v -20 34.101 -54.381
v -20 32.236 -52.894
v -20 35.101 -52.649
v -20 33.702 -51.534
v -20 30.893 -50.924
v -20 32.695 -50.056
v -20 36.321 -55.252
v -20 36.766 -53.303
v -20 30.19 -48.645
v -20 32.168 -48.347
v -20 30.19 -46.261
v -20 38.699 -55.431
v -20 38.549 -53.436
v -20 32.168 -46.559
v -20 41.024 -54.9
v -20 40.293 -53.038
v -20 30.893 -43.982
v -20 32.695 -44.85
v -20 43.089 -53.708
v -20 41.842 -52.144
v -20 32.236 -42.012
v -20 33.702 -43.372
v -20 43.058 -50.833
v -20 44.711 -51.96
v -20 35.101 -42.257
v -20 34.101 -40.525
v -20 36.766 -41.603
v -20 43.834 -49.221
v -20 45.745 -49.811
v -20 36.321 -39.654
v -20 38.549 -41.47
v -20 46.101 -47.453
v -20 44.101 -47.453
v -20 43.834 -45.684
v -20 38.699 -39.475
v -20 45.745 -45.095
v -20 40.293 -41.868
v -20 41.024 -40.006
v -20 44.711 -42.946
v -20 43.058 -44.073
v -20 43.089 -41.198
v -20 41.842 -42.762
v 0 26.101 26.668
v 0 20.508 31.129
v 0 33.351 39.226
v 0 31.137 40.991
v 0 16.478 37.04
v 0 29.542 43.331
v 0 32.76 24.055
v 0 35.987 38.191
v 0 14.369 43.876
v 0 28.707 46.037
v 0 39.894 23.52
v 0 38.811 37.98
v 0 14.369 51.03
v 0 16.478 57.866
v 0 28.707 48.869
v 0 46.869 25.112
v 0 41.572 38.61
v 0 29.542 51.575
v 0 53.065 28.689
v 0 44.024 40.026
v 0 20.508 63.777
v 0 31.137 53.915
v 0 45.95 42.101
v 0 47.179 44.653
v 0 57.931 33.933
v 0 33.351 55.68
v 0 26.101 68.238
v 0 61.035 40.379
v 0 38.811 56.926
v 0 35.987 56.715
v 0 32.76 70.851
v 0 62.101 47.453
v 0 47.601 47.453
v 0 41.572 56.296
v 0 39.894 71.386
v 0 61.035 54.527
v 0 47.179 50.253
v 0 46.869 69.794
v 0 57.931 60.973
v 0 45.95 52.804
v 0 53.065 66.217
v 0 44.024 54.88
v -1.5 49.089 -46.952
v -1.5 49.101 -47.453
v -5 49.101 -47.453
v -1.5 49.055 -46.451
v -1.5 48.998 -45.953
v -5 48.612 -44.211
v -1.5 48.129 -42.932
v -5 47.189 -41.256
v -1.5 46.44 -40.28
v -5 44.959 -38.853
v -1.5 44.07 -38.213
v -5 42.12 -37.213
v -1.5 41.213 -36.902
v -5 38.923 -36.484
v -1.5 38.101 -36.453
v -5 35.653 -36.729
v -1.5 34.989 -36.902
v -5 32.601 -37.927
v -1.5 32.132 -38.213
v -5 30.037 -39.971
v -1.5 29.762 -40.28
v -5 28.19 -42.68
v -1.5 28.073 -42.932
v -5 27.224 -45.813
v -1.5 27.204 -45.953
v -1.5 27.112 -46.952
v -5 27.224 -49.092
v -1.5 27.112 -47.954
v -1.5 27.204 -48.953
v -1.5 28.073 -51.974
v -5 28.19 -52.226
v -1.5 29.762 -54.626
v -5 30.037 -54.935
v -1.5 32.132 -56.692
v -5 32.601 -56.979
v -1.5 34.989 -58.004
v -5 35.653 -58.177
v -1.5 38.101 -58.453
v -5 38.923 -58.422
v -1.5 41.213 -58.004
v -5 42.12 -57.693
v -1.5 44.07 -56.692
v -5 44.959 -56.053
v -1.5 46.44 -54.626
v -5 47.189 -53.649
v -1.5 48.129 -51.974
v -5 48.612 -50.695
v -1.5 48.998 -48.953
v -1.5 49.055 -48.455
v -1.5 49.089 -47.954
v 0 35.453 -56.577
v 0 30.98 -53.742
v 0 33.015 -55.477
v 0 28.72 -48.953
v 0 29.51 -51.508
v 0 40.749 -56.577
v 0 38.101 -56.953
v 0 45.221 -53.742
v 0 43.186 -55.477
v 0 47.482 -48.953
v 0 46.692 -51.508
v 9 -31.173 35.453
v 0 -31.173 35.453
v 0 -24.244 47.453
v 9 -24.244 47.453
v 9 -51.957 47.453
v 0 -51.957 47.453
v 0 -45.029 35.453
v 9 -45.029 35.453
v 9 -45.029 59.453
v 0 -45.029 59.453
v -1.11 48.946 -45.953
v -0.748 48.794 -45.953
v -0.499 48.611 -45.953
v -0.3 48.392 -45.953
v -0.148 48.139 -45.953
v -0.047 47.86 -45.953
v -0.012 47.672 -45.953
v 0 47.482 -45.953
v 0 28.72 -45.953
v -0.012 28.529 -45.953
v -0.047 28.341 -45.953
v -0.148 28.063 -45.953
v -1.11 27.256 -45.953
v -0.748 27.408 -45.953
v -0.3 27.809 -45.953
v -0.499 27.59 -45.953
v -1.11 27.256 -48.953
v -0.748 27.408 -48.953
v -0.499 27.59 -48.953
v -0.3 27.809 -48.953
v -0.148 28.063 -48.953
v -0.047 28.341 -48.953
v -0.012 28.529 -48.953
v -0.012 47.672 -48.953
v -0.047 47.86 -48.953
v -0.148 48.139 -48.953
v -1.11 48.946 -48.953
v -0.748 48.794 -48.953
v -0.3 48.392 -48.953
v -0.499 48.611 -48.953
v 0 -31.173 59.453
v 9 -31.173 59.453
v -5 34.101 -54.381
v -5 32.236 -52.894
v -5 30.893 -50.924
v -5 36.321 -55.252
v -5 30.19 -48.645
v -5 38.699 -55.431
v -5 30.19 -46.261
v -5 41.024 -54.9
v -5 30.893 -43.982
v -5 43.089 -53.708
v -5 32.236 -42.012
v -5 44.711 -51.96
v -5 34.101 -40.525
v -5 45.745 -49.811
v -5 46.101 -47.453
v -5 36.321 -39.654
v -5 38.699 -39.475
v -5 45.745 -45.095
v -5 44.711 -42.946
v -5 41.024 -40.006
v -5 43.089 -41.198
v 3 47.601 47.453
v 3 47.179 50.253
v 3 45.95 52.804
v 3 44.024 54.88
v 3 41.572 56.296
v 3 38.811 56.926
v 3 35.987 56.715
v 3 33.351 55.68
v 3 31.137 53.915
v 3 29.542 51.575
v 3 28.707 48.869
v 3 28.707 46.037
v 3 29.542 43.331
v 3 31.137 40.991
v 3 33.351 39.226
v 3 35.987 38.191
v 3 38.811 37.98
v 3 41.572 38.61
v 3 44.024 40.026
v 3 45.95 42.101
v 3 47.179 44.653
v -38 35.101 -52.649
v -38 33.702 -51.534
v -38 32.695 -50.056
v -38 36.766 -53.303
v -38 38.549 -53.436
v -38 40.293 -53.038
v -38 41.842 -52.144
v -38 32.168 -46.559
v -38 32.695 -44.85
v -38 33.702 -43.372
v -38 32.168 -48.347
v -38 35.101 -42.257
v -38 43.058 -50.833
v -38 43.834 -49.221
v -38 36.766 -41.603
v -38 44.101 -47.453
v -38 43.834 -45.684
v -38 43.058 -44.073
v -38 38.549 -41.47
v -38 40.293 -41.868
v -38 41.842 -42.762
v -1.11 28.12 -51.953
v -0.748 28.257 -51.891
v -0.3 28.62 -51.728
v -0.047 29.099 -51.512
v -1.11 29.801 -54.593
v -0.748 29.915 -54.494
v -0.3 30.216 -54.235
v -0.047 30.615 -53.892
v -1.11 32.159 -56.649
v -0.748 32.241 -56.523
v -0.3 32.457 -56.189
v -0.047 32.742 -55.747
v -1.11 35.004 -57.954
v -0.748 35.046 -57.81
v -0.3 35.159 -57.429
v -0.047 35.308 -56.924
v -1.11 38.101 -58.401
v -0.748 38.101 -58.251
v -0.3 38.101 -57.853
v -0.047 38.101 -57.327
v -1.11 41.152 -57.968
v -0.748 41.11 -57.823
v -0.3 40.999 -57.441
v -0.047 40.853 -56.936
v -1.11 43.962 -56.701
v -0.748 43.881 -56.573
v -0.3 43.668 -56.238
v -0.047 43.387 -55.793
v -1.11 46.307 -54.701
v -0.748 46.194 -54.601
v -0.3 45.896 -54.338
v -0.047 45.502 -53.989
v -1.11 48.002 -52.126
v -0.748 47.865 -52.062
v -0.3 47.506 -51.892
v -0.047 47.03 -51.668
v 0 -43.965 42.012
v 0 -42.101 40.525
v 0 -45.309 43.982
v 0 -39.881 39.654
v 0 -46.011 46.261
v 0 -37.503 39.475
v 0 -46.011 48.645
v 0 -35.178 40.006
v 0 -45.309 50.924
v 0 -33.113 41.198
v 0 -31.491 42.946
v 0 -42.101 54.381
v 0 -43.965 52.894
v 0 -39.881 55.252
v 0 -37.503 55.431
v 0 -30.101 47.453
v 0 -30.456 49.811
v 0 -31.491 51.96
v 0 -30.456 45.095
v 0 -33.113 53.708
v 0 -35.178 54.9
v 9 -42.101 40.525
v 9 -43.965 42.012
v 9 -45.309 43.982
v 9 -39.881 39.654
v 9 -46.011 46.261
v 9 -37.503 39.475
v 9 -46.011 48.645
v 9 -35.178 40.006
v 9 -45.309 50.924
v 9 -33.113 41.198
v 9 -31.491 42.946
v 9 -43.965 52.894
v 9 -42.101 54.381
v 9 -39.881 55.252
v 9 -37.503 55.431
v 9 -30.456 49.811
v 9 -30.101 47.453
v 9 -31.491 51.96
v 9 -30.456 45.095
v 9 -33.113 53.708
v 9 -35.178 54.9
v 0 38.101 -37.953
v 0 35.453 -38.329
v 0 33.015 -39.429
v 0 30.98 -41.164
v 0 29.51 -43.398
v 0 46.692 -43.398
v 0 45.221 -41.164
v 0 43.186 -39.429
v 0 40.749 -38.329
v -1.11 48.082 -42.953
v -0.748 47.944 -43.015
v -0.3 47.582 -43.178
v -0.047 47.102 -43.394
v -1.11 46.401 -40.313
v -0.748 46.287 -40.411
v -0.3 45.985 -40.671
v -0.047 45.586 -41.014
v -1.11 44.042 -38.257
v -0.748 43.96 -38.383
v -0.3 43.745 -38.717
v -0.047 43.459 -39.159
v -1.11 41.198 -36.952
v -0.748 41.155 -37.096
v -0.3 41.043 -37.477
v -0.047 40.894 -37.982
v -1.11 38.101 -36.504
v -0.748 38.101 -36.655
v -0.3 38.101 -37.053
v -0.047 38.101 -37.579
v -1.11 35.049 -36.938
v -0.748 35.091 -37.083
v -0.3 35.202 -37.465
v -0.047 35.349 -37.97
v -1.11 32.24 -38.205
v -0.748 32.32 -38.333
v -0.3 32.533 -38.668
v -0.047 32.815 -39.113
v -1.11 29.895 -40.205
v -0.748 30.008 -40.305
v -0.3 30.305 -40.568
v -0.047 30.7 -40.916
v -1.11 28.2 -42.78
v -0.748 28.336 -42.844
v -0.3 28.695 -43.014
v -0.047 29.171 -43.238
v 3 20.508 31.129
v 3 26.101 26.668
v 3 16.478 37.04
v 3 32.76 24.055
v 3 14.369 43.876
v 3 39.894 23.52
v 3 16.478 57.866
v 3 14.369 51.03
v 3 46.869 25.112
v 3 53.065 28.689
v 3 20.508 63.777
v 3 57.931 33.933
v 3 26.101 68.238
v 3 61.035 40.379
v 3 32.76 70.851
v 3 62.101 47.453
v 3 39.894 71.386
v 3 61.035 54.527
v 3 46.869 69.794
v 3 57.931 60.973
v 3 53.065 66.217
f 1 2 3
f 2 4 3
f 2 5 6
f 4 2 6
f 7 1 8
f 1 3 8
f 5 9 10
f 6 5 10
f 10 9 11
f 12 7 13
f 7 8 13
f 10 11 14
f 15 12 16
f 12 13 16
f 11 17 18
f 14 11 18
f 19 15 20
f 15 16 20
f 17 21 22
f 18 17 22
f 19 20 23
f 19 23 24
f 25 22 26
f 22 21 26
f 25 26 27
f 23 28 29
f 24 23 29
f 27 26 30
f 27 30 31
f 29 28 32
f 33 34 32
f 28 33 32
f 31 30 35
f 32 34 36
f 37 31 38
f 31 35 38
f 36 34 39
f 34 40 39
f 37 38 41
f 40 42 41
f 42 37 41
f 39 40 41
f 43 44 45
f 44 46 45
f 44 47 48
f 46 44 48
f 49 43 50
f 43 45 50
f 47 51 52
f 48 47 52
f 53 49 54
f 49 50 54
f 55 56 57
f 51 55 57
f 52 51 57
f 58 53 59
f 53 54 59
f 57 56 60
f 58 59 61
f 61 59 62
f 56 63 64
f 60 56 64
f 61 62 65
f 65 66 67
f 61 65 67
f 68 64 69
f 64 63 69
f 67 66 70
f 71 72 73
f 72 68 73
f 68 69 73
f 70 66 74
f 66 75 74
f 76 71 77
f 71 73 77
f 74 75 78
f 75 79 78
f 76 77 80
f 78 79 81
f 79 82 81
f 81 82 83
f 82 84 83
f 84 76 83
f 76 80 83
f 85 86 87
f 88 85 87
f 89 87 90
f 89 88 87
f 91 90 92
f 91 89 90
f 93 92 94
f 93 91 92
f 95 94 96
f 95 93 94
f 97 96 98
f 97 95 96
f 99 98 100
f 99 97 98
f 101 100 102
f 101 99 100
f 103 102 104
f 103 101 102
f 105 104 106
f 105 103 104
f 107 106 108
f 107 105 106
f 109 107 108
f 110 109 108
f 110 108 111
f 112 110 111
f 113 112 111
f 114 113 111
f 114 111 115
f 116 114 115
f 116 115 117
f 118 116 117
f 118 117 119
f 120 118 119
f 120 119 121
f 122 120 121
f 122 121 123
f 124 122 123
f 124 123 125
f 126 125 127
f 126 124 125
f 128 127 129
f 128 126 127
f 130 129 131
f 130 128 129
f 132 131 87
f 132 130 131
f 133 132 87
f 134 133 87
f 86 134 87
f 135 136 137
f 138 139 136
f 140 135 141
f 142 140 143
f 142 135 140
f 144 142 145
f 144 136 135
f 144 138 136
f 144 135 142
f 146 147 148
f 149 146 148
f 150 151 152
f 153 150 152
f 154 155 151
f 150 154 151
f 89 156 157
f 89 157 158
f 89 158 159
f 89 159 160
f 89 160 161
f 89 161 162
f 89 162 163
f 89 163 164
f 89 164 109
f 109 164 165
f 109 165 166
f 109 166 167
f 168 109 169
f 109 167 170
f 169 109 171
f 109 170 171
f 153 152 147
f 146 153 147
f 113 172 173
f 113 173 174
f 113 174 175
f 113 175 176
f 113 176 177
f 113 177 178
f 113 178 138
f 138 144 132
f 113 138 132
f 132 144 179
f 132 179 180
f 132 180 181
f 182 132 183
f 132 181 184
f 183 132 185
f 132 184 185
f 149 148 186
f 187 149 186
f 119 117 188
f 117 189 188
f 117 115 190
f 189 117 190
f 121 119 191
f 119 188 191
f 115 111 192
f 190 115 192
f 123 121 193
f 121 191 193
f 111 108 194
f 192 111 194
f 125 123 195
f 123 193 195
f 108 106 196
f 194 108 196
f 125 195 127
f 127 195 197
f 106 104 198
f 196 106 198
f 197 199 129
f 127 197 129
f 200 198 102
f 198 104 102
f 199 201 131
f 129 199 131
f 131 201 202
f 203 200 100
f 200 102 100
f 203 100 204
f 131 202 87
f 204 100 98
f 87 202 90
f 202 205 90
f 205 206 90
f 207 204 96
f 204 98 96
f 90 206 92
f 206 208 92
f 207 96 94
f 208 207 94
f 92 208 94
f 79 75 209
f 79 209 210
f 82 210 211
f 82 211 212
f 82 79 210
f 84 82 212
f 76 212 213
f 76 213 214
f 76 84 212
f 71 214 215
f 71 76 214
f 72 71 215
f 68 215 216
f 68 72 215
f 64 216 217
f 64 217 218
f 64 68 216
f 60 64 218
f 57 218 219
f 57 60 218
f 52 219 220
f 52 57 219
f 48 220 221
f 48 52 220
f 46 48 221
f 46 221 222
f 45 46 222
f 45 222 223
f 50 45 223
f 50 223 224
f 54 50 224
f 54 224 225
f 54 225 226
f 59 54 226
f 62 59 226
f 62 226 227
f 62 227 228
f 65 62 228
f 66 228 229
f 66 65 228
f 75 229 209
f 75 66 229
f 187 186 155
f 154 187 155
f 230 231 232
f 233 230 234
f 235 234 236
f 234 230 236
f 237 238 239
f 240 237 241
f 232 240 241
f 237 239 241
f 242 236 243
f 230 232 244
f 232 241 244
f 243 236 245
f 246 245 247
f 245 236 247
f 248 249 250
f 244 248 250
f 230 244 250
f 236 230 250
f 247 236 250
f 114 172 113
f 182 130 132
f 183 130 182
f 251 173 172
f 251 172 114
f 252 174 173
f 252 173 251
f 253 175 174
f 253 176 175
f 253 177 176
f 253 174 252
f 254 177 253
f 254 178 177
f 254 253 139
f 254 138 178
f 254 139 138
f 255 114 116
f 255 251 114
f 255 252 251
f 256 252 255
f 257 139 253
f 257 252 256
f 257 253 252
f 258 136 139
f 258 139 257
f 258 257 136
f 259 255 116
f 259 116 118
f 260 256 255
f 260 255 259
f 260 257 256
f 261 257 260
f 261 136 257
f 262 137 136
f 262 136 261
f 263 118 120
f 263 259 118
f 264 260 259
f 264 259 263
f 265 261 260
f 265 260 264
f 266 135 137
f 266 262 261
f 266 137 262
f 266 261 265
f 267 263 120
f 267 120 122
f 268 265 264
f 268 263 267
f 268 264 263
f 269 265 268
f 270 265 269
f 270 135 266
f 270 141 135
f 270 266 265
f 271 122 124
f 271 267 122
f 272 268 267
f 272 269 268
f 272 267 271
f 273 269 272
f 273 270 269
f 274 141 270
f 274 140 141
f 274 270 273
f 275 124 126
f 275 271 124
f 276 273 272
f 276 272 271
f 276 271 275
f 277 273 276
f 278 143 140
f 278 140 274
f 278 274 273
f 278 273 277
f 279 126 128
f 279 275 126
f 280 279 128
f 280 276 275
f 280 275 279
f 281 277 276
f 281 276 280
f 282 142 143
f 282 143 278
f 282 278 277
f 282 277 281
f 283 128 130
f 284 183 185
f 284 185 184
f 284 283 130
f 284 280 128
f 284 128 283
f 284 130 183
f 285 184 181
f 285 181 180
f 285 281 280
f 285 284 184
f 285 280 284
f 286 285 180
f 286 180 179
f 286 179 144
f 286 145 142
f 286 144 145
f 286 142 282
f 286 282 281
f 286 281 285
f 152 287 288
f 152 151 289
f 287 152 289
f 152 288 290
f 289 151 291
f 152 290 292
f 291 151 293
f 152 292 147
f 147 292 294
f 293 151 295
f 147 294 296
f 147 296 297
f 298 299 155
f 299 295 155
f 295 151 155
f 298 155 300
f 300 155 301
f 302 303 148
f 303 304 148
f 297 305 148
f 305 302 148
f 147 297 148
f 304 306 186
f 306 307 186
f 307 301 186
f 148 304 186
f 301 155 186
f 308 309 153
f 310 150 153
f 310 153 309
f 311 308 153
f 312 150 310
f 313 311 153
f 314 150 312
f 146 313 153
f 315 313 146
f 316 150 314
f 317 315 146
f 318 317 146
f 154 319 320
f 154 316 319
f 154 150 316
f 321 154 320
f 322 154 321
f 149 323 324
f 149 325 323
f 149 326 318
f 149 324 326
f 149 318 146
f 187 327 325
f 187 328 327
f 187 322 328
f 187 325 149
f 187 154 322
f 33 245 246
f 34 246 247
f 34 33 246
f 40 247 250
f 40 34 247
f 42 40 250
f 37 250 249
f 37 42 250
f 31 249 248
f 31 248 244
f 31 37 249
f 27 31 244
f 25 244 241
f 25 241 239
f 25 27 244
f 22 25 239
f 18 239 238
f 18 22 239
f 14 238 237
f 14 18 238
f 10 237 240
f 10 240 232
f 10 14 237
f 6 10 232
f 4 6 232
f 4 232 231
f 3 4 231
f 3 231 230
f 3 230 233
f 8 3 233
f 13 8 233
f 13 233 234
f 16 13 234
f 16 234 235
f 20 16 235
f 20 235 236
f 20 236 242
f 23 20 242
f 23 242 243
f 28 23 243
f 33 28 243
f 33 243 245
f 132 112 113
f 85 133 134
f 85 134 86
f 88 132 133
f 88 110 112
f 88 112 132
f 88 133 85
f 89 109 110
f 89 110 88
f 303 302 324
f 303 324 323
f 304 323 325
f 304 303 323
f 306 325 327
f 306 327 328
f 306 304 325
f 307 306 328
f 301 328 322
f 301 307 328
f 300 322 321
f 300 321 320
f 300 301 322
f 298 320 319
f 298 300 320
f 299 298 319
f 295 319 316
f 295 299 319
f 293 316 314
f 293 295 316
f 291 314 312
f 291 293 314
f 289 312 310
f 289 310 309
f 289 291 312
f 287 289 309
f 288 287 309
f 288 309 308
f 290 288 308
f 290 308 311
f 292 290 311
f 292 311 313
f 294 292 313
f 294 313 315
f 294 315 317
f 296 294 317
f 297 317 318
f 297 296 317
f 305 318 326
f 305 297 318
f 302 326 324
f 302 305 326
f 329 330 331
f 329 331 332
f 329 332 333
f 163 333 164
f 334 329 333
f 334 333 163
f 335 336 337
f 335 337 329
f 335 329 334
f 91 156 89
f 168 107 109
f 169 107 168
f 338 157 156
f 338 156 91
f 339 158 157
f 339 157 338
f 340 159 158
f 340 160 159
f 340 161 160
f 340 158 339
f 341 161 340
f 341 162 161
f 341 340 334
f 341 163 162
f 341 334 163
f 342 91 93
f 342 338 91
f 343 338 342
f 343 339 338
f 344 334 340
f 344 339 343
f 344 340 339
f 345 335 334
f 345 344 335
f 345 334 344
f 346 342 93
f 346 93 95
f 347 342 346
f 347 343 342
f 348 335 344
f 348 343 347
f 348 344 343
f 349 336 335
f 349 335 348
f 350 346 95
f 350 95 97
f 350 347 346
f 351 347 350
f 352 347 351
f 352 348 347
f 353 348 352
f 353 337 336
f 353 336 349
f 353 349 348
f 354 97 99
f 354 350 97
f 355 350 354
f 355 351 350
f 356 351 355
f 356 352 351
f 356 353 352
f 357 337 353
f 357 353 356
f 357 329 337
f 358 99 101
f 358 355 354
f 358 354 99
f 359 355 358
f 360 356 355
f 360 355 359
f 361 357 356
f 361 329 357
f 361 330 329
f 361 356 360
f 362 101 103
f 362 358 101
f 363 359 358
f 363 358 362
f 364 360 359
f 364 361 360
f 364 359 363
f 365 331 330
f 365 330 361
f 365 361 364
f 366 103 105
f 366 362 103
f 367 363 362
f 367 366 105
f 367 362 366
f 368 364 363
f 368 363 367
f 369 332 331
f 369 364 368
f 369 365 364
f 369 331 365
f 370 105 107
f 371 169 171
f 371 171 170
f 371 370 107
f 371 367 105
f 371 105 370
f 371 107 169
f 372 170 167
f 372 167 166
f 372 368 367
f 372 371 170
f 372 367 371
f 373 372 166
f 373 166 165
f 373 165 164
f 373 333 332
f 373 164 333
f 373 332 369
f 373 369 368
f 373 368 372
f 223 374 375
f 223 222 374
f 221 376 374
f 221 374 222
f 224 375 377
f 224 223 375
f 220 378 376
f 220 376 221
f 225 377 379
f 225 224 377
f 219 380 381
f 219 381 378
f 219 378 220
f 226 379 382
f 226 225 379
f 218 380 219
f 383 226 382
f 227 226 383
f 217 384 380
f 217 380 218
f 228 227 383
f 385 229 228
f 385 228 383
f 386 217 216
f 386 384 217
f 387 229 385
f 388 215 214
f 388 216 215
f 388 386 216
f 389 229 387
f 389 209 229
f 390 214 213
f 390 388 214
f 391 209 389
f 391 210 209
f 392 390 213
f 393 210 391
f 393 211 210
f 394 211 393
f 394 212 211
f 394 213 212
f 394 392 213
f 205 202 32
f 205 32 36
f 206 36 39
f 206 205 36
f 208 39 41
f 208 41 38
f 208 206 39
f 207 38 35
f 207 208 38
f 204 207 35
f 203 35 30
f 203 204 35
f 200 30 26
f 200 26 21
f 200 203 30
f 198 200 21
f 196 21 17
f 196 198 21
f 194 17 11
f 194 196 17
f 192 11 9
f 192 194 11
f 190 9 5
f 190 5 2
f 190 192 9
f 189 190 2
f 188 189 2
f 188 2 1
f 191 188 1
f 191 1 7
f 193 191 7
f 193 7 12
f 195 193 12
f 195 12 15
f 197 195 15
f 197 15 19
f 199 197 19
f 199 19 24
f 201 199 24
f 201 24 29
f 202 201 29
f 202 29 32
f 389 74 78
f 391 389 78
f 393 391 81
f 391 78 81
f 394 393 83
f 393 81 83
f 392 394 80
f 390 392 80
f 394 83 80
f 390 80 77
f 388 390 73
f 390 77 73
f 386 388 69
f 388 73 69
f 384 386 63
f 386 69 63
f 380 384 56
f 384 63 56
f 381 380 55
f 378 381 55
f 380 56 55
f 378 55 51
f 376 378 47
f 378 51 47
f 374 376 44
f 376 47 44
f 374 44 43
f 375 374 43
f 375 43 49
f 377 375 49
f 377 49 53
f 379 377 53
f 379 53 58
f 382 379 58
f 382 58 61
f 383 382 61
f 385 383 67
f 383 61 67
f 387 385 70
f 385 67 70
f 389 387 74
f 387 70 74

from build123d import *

# Parameters (mm, degrees)
F0_R     = 24
F0_R_2   = 9.5
F1_DEPTH = 3
F0_R_3   = 8
F2_DEPTH = 9
F0_R_4   = 11
F3_DEPTH = 5
F0_R_5   = 6
F4_DEPTH = 20
F5_DEPTH = 38
F7_DEPTH = 1.5
F8_R     = 1.5


with BuildPart() as f1:
    # F0 (on Right) → F1 (new body)
    with BuildSketch(Plane.YZ):
        with Locations((38.1007837561, 47.4529557896)):
            Circle(F0_R)
        with Locations((38.1007837561, 47.4529557896)):
            Circle(F0_R_2, mode=Mode.SUBTRACT)
    extrude(amount=F1_DEPTH)


with BuildPart() as f2:
    # F0 (on Right) → F2 (new body)
    with BuildSketch(Plane.YZ):
        Polygon((-31.1725805258, 59.4529557896), (-45.0289869863, 59.4529557896), (-51.9571902166, 47.4529557896), (-45.0289869863, 35.4529557896), (-31.1725805258, 35.4529557896), (-24.2443772955, 47.4529557896), align=None)
        with Locations((-38.1007837561, 47.4529557896)):
            Circle(F0_R_3, mode=Mode.SUBTRACT)
    extrude(amount=F2_DEPTH)


with BuildPart() as f3:
    # F0 (on Right) → F3 (new body)
    with BuildSketch(Plane.YZ):
        with Locations((38.1007837561, -47.4529557896)):
            Circle(F0_R_4)
        with Locations((38.1007837561, -47.4529557896)):
            Circle(F0_R_3, mode=Mode.SUBTRACT)
    extrude(amount=-F3_DEPTH)

    # F0 (on Right) → F4 (join)
    with BuildSketch(Plane.YZ):
        with Locations((38.1007837561, -47.4529557896)):
            Circle(F0_R_3)
        with Locations((38.1007837561, -47.4529557896)):
            Circle(F0_R_5, mode=Mode.SUBTRACT)
    extrude(amount=-F4_DEPTH)

    # F0 (on Right) → F5 (join)
    with BuildSketch(Plane.YZ):
        with Locations((38.1007837561, -47.4529557896)):
            Circle(F0_R_5)
    extrude(amount=-F5_DEPTH)

    # F6 (on face) → F7 (cut)
    with BuildSketch(Plane.YZ):
        with BuildLine():
            ThreePointArc((48.9980311149, -48.9529557896), (49.0750655309, -48.2047134144), (49.1007837561, -47.4529557896))
            ThreePointArc((49.1007837561, -47.4529557896), (49.0750655309, -46.7011981649), (48.9980311149, -45.9529557896))
            Line((48.9980311149, -45.9529557896), (45.9589005788, -45.9529557896))
            ThreePointArc((45.9589005788, -45.9529557896), (46.0652339751, -46.6996081216), (46.1007837561, -47.4529557896))
            ThreePointArc((46.1007837561, -47.4529557896), (46.0652339751, -48.2063034577), (45.9589005788, -48.9529557896))
            Line((45.9589005788, -48.9529557896), (48.9980311149, -48.9529557896))
        make_face()
        with BuildLine():
            ThreePointArc((46.1007837561, -47.4529557896), (46.0652339751, -46.6996081216), (45.9589005788, -45.9529557896))
            Line((45.9589005788, -45.9529557896), (30.2426669333, -45.9529557896))
            ThreePointArc((30.2426669333, -45.9529557896), (30.1007837561, -47.4529557896), (30.2426669333, -48.9529557896))
            Line((30.2426669333, -48.9529557896), (45.9589005788, -48.9529557896))
            ThreePointArc((45.9589005788, -48.9529557896), (46.0652339751, -48.2063034577), (46.1007837561, -47.4529557896))
        make_face()
        with BuildLine():
            Line((30.2426669333, -45.9529557896), (27.2035363972, -45.9529557896))
            ThreePointArc((27.2035363972, -45.9529557896), (27.1007837561, -47.4529557896), (27.2035363972, -48.9529557896))
            Line((27.2035363972, -48.9529557896), (30.2426669333, -48.9529557896))
            ThreePointArc((30.2426669333, -48.9529557896), (30.1007837561, -47.4529557896), (30.2426669333, -45.9529557896))
        make_face()
    extrude(amount=-F7_DEPTH, mode=Mode.SUBTRACT)

    # F8
    f8_edges = [f3.edges().sort_by_distance(p)[0] for p in [
        (0, 38.100784, -36.452956),
        (0, 38.100784, -58.452956),
    ]]
    fillet(f8_edges, radius=F8_R)


solid = Compound([f1.part, f2.part, f3.part])
